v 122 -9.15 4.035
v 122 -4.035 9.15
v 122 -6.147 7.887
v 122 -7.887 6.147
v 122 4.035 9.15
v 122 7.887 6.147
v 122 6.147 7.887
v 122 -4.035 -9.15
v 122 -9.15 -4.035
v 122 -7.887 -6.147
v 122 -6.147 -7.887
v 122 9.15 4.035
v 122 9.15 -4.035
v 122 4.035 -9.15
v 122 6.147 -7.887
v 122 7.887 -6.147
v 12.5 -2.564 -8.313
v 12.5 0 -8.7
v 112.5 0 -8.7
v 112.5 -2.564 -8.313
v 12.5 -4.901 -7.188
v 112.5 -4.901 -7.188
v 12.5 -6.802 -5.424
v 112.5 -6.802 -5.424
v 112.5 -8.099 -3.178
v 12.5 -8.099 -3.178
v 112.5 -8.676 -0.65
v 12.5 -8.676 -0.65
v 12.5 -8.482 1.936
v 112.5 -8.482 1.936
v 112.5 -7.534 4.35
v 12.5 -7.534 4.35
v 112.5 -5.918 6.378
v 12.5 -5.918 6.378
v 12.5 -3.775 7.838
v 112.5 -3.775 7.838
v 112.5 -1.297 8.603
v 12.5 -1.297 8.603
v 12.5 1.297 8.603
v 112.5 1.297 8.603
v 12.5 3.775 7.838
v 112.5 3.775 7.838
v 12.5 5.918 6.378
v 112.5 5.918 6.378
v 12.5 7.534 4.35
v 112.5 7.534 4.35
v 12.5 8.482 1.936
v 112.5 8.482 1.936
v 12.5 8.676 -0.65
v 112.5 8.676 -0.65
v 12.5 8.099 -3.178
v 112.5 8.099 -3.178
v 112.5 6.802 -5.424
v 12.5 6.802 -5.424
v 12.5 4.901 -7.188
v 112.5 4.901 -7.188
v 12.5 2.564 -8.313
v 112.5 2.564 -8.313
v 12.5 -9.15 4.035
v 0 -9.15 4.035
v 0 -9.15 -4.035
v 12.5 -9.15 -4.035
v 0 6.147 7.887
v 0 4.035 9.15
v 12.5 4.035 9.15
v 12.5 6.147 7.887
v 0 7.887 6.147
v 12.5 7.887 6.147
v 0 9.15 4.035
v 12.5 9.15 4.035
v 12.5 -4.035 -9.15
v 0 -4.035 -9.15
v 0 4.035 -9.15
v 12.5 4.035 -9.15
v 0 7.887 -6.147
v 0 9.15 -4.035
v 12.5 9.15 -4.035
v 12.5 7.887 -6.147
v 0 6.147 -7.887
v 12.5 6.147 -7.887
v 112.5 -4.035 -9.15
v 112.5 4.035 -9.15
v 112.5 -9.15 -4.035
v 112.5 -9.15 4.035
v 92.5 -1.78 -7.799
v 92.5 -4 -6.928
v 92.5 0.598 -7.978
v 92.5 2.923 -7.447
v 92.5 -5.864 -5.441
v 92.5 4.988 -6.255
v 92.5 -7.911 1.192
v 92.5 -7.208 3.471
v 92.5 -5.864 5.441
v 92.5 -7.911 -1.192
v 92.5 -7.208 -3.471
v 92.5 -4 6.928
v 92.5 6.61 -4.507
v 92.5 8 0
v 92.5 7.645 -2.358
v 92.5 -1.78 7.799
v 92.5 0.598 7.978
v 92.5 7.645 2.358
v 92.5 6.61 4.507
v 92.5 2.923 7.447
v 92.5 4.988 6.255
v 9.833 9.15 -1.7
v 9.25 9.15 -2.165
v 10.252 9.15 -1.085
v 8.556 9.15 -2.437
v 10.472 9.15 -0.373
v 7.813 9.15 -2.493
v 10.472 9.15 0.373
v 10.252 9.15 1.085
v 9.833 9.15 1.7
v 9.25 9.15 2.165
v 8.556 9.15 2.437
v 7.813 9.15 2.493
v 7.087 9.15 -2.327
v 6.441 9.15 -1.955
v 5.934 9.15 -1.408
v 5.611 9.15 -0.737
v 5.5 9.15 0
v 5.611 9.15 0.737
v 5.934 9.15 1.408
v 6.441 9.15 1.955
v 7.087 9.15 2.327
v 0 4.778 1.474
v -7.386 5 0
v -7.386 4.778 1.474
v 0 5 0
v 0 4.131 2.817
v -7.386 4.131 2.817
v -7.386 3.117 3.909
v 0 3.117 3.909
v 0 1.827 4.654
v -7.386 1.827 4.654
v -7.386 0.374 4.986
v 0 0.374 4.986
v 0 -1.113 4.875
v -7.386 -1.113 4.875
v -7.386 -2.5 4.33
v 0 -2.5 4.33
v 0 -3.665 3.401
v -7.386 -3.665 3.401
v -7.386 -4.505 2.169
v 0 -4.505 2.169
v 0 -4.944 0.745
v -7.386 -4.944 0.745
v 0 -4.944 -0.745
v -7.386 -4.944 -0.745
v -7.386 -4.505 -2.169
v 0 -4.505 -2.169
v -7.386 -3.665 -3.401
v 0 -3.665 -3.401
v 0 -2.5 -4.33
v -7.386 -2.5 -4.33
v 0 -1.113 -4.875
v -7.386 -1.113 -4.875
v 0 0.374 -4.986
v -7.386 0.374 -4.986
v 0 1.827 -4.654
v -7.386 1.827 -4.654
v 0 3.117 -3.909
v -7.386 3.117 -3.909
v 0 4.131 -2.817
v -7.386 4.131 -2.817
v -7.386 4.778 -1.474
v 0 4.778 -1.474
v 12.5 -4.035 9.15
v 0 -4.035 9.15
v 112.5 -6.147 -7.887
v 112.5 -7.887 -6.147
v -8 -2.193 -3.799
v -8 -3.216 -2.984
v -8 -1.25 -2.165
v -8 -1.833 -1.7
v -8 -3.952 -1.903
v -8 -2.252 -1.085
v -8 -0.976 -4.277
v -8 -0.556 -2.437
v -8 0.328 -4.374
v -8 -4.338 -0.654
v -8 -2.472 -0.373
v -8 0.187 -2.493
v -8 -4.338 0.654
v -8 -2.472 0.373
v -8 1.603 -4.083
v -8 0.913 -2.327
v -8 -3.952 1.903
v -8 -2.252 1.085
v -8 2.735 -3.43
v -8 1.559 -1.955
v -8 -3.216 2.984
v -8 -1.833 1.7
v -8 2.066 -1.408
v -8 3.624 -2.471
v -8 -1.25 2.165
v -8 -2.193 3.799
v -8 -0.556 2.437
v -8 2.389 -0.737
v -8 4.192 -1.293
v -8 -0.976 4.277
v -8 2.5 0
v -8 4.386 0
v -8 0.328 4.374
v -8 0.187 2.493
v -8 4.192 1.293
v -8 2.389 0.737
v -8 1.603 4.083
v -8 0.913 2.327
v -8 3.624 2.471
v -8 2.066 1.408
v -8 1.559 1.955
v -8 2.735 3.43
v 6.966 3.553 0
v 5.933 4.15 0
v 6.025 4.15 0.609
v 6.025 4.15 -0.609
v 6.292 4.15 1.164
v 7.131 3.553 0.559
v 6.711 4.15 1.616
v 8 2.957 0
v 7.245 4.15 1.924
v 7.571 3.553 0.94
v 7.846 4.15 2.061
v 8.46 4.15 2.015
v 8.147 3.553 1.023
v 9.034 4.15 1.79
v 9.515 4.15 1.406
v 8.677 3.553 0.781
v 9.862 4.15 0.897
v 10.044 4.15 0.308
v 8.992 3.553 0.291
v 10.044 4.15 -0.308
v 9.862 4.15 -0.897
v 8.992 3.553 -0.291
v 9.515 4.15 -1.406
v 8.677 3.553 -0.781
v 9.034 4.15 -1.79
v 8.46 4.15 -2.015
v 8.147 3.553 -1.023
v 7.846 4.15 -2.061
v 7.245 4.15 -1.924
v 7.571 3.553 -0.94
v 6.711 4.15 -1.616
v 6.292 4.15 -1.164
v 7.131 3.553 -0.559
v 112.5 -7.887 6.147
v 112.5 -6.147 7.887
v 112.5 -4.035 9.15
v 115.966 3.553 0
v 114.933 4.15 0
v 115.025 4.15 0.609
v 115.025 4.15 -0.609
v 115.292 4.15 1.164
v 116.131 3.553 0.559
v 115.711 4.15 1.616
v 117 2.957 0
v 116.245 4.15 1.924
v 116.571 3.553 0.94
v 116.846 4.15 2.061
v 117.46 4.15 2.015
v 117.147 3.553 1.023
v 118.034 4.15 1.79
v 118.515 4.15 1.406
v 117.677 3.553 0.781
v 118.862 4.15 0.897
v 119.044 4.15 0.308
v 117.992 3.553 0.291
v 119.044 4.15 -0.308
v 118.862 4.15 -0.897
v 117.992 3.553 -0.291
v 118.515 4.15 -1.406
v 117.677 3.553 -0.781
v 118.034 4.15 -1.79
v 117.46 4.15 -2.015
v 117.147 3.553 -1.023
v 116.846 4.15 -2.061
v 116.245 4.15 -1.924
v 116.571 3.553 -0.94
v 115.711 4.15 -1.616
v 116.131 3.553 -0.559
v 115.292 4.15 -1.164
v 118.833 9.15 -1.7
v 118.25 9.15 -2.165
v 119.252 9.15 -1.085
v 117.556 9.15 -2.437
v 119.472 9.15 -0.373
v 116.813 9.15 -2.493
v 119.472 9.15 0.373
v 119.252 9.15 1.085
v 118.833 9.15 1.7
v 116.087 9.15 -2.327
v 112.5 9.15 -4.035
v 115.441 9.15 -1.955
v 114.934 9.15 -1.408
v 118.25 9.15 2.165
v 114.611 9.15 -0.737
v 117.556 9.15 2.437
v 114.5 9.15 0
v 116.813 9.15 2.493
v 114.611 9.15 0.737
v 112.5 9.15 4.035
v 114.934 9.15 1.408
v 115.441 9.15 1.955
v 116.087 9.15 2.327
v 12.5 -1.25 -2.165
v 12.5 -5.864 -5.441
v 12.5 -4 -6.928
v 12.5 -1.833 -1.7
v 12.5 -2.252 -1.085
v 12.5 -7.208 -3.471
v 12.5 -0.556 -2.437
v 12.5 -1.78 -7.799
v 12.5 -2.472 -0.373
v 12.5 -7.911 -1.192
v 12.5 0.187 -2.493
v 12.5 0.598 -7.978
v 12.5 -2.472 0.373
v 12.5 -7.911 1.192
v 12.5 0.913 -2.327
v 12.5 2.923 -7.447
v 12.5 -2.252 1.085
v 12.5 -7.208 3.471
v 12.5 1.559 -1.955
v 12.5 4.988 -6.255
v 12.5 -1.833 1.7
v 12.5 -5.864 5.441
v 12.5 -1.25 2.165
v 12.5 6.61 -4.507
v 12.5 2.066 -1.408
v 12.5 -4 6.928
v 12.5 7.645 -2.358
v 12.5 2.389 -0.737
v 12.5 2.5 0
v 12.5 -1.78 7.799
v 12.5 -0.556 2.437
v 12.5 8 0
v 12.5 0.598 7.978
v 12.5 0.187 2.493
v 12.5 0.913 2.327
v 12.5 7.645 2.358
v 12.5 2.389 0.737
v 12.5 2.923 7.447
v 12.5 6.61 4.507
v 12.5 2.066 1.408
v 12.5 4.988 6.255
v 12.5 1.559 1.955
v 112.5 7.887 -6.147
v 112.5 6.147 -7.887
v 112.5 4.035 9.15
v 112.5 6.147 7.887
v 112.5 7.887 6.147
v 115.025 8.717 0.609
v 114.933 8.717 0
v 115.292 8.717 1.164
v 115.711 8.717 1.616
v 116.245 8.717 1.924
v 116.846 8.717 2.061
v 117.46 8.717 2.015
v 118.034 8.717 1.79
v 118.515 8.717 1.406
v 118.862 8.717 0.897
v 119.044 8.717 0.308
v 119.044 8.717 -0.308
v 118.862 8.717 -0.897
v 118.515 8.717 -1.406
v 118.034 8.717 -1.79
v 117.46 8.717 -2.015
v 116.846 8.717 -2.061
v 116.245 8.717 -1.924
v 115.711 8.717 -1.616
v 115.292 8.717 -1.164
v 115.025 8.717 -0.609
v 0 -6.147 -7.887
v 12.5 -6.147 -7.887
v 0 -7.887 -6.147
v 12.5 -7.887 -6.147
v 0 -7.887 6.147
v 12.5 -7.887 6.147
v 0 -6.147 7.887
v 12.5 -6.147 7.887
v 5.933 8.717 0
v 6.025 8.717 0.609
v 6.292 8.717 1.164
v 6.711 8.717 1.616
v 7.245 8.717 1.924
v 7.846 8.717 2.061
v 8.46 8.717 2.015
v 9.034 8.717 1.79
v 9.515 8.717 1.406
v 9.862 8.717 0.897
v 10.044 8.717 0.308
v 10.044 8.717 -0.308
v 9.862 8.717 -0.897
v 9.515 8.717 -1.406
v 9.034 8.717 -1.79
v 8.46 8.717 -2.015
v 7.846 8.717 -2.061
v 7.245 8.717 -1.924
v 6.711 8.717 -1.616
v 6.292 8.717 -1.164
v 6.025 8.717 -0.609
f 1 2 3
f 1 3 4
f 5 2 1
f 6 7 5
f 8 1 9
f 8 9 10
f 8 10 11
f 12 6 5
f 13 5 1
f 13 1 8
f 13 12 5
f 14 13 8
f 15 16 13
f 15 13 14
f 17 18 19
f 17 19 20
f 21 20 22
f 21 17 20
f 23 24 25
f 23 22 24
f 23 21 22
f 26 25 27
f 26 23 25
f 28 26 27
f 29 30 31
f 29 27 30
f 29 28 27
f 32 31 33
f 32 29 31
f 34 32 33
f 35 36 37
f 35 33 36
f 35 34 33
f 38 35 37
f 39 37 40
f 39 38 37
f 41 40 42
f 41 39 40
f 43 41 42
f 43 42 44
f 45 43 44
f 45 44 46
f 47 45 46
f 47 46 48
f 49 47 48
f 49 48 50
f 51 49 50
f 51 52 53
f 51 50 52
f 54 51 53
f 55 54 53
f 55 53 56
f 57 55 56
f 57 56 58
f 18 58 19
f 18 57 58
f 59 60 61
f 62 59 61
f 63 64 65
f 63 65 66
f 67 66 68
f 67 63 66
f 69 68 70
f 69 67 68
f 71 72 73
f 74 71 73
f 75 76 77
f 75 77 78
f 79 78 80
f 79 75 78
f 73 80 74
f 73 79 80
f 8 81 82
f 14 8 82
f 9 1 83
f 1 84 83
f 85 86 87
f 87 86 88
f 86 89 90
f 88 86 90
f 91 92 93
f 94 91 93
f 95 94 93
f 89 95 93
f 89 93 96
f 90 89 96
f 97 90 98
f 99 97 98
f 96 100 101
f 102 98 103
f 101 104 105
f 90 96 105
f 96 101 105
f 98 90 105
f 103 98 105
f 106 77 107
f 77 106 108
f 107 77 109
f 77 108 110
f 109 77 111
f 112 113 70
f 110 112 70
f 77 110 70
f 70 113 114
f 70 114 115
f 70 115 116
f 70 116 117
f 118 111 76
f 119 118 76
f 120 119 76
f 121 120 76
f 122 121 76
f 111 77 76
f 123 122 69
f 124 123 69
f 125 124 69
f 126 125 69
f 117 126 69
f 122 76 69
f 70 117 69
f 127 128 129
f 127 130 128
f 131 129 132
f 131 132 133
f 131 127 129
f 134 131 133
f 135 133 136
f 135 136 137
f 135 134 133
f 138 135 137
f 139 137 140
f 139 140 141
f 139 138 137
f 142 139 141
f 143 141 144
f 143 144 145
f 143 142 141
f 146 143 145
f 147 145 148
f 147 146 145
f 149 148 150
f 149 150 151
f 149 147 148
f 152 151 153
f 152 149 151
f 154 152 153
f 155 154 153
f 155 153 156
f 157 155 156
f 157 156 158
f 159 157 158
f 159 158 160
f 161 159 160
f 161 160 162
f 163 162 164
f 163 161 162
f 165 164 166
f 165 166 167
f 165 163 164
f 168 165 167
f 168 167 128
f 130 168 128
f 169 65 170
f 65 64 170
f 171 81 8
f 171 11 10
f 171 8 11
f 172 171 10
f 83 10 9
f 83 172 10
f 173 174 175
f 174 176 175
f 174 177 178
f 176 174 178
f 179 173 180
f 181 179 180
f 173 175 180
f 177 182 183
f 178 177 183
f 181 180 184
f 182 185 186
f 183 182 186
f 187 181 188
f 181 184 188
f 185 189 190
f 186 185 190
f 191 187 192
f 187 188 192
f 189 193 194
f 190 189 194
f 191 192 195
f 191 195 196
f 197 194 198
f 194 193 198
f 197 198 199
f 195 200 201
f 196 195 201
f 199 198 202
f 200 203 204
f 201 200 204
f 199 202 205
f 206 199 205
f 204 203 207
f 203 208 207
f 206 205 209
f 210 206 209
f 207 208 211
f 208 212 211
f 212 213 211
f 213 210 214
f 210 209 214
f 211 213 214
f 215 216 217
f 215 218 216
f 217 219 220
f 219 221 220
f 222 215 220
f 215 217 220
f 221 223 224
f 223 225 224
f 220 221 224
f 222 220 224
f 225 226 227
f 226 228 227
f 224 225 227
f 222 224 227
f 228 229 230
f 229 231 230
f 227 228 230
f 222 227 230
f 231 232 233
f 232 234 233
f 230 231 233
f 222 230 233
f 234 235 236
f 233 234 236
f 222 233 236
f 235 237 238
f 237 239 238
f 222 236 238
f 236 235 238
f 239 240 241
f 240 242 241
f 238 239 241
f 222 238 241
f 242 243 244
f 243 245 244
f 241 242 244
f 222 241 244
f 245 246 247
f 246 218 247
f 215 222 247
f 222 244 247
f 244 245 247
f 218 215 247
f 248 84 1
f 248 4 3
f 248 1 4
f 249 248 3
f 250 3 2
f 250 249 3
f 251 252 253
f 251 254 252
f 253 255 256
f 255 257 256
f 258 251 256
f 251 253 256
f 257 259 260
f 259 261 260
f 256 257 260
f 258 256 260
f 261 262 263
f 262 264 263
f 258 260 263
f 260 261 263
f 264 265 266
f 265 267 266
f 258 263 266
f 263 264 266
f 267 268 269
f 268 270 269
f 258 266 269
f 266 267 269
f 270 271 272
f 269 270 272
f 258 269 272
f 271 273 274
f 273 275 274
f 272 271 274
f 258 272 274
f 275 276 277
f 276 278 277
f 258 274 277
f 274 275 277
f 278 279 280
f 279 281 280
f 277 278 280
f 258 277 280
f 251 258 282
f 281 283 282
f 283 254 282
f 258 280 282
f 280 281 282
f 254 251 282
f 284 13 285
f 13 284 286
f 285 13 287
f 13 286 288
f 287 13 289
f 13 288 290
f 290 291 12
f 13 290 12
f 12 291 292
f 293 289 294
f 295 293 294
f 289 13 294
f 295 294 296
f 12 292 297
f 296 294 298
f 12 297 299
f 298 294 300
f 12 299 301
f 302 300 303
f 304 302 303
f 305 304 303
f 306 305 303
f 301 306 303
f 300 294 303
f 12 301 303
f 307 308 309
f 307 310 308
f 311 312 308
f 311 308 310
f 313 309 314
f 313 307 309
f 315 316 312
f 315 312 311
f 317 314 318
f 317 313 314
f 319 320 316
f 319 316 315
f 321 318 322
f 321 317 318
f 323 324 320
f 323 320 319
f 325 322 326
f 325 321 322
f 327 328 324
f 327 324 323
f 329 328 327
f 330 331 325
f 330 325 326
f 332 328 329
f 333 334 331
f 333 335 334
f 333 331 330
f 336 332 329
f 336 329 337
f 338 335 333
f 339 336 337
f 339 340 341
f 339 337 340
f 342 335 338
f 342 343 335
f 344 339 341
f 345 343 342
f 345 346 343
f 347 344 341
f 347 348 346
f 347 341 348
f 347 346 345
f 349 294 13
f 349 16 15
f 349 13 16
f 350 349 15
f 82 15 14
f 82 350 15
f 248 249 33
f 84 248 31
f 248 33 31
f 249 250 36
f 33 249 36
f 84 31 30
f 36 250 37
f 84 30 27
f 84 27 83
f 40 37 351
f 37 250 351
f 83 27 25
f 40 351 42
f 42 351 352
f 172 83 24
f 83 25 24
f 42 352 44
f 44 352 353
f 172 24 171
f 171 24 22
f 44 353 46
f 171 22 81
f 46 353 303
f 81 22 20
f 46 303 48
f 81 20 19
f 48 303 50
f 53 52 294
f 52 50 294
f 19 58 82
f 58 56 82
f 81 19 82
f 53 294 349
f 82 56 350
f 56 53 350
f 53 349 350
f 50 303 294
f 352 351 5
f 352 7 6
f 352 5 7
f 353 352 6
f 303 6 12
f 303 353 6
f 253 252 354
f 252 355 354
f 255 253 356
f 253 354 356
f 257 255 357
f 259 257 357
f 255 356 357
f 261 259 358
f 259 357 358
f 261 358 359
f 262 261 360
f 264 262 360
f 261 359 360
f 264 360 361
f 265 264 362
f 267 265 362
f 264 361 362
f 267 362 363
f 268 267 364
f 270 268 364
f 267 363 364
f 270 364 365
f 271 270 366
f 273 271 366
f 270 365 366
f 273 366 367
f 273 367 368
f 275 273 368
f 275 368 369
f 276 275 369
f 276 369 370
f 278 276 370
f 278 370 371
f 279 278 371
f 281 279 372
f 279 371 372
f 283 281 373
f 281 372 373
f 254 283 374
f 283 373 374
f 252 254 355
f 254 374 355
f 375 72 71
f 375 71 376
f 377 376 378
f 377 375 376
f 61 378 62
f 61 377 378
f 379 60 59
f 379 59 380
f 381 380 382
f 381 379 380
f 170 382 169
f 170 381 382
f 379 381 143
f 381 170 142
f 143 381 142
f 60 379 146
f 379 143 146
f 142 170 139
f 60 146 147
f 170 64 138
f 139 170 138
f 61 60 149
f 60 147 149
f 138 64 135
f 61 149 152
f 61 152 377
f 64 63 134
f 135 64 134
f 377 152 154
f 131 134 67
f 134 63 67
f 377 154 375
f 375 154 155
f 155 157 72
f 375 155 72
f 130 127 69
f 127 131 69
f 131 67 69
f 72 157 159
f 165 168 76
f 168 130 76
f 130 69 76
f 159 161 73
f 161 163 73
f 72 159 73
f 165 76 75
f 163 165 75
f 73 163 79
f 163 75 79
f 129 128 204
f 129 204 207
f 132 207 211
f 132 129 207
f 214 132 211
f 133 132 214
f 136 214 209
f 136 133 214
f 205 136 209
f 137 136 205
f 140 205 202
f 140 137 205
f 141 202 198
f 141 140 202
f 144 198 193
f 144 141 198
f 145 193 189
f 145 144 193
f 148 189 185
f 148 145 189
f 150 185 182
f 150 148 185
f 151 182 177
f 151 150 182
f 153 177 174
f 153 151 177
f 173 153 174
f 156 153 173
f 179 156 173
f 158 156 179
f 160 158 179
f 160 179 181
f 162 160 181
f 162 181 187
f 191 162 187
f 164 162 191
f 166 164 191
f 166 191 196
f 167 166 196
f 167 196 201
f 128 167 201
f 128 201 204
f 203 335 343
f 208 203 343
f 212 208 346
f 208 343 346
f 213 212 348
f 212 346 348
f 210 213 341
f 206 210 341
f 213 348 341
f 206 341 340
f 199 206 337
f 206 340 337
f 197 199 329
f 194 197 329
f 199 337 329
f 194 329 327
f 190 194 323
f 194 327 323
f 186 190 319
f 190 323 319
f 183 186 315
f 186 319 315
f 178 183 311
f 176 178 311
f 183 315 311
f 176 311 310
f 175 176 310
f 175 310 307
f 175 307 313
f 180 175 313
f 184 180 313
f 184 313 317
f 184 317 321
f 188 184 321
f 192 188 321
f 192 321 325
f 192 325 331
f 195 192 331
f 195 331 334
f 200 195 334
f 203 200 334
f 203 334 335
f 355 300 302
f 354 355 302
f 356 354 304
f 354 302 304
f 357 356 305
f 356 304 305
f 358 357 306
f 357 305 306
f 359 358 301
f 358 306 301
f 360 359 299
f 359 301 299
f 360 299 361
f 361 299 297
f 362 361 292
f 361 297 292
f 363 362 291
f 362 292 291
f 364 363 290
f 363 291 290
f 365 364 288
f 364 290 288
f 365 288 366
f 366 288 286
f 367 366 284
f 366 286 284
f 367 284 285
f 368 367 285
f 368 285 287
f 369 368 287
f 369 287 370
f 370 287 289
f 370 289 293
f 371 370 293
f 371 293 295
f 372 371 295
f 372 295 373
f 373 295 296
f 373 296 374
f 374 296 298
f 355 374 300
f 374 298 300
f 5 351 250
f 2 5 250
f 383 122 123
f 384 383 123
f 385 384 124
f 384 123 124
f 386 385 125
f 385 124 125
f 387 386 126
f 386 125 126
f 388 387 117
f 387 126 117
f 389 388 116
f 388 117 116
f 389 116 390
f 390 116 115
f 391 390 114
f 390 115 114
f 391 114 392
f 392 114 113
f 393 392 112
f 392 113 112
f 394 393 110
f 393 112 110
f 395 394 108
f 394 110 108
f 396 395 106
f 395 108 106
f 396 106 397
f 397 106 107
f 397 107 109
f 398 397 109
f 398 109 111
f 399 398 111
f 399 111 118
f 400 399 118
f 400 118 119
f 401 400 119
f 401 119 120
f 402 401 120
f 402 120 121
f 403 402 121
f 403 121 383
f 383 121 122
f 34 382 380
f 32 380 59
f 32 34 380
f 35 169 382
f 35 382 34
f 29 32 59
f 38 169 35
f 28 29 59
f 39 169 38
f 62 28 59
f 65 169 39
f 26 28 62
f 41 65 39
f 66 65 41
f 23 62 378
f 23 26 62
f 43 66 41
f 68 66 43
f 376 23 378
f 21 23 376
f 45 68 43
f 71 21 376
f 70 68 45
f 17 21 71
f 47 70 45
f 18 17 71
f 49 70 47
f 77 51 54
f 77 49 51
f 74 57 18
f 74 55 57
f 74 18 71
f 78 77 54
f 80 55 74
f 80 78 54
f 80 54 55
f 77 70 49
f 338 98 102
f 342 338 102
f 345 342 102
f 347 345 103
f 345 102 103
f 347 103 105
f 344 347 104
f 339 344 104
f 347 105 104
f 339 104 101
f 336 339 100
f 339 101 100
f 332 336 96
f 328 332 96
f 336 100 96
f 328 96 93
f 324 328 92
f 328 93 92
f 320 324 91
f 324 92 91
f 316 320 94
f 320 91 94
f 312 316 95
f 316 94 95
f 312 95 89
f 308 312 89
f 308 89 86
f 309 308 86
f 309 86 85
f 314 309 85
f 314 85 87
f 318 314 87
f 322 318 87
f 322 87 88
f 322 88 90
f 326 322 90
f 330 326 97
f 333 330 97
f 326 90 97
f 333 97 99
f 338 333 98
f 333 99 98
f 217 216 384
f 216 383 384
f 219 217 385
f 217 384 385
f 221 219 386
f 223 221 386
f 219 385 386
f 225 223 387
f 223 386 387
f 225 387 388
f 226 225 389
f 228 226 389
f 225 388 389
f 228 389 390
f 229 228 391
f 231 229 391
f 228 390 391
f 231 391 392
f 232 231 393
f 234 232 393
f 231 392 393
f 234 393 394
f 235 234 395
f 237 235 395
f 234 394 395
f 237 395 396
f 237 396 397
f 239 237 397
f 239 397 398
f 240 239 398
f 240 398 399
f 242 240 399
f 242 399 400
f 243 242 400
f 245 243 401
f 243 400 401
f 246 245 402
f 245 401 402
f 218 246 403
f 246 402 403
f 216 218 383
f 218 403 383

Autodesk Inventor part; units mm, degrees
sketch "Sketch_8" plane through (0, 0, 0) normal (0, 0, 1) x (1, 0, 0)
  line L0 (0, 0) -> (-8, 0)
  line L1 (-8, 0) -> (-8, 4.3865)
  line L2 (-8, 4.3865) -> (-7.3865, 5)
  line L3 (-7.3865, 5) -> (0, 5)
  line L4 (0, 5) -> (0, 0)
  line L5 (0, 0) -> (-8, 0)
revolve "Revolution1" add sketch "Sketch_8" angle 360 about axis through (0, 0, 0) along (1, 0, 0)
thread "Thread1" size "M10x1" class "6g" standard "ISO Metric profile" length 5.8865
sketch "Sketch_9" plane through (0, 0, 0) normal (1, 0, 0) x (0, 0, -1)
  line L0 (-9.15, 4.0345) -> (-9.15, -4.0345)
  arc A0 (-9.15, -4.0345) -> (-4.0345, -9.15) centre (0, 0) ccw
  line L1 (-4.0345, -9.15) -> (4.0345, -9.15)
  arc A1 (4.0345, -9.15) -> (9.15, -4.0345) centre (0, 0) ccw
  line L2 (9.15, -4.0345) -> (9.15, 4.0345)
  arc A2 (9.15, 4.0345) -> (4.0345, 9.15) centre (0, 0) ccw
  line L3 (4.0345, 9.15) -> (-4.0345, 9.15)
  arc A3 (-4.0345, 9.15) -> (-9.15, 4.0345) centre (0, 0) ccw
extrude "Extrusion1" add sketch "Sketch_9" along normal blind 12.5
sketch "Sketch_11" plane through (12.5, 0, 0) normal (1, 0, 0) x (0, 0, -1)
  circle A0 centre (0, 0) radius 8.7
extrude "Extrusion2" add sketch "Sketch_11" along normal blind 100
sketch "Sketch_10" plane through (112.5, 0, 0) normal (1, 0, 0) x (0, 0, -1)
  line L0 (-9.15, 4.0345) -> (-9.15, -4.0345)
  arc A0 (-9.15, -4.0345) -> (-4.0345, -9.15) centre (0, 0) ccw
  line L1 (-4.0345, -9.15) -> (4.0345, -9.15)
  arc A1 (4.0345, -9.15) -> (9.15, -4.0345) centre (0, 0) ccw
  line L2 (9.15, -4.0345) -> (9.15, 4.0345)
  arc A2 (9.15, 4.0345) -> (4.0345, 9.15) centre (0, 0) ccw
  line L3 (4.0345, 9.15) -> (-4.0345, 9.15)
  arc A3 (-4.0345, 9.15) -> (-9.15, 4.0345) centre (0, 0) ccw
extrude "Extrusion3" add sketch "Sketch_10" along normal blind 9.5
sketch "Sketch7" plane through (0, 0, 0) normal (0, 0, 1) x (1, 0, 0)
  line L0 (8, 9.15) -> (8, 4.15)
  line L1 (8, 2.9566) -> (5.933, 4.15)
  line L2 (5.933, 4.15) -> (5.933, 8.717)
  line L3 (5.933, 8.717) -> (5.5, 9.15)
  line L4 (5.5, 9.15) -> (8, 9.15)
  line L5 (8, 9.15) -> (8, 2.9566)
revolve "Revolution2" cut sketch "Sketch7" angle 360 about axis through (8, 9.15, 0) along (0, 1, 0)
thread "Thread2" size "M5x0.8" class "6H" standard "ISO Metric profile" full length
sketch "Sketch_7" plane through (0, 0, 0) normal (0, 0, 1) x (1, 0, 0)
  line L0 (117, 9.15) -> (117, 4.15)
  line L1 (117, 2.9566) -> (114.933, 4.15)
  line L2 (114.933, 4.15) -> (114.933, 8.717)
  line L3 (114.933, 8.717) -> (114.5, 9.15)
  line L4 (114.5, 9.15) -> (117, 9.15)
  line L5 (117, 9.15) -> (117, 2.9566)
revolve "Revolution3" cut sketch "Sketch_7" angle 360 about axis through (117, 9.15, 0) along (0, 1, 0)
thread "Thread3" size "M5x0.8" class "6H" standard "ISO Metric profile" full length
sketch "Sketch_16" plane through (0, 0, 0) normal (0, 0, 1) x (1, 0, 0)
  line L0 (92.5, 0) -> (-8, 0)
  line L1 (-8, 0) -> (-8, 2.5)
  line L2 (-8, 2.5) -> (12.5, 2.5)
  line L3 (12.5, 2.5) -> (12.5, 8)
  line L4 (12.5, 8) -> (92.5, 8)
  line L5 (92.5, 8) -> (92.5, 0)
  line L6 (92.5, 0) -> (-8, 0)
revolve "Revolution4" cut sketch "Sketch_16" angle 360 about axis through (92.5, 0, 0) along (1, 0, 0)
ref_plane "BODY_N_XY" through (122, 0, 0) normal (0, 0, -1) x (1, 0, 0)
ref_plane "BODY_N_YZ" through (122, 0, 0) normal (1, 0, 0) x (0, -1, 0)
ref_plane "BODY_N_ZX" through (122, 0, 0) normal (0, -1, 0) x (0, 0, -1)
ref_plane "NUT2_XY" through (122, 0, 0) normal (1, 0, 0) x (0, 0, -1)
ref_plane "NUT2_YZ" through (122, 0, 0) normal (0, 0, -1) x (0, 1, 0)
ref_plane "NUT2_ZX" through (122, 0, 0) normal (0, 1, 0) x (1, 0, 0)
ref_plane "SW1_XY" through (17.5, 0, 0) normal (1, 0, 0) x (0, 0, -1)
ref_plane "SW1_YZ" through (17.5, 0, 0) normal (0, 0, -1) x (0, 1, 0)
ref_plane "SW1_ZX" through (17.5, 0, 0) normal (0, 1, 0) x (1, 0, 0)
ref_plane "SW2_XY" through (107.5, 0, 0) normal (-1, 0, 0) x (0, 0, -1)
ref_plane "SW2_YZ" through (107.5, 0, 0) normal (0, 0, -1) x (0, -1, 0)
ref_plane "SW2_ZX" through (107.5, 0, 0) normal (0, -1, 0) x (-1, 0, 0)
ref_plane "SW_R1_XY" through (17.5, -14.15, 0) normal (1, 0, 0) x (0, 0, -1)
ref_plane "SW_R1_YZ" through (17.5, -14.15, 0) normal (0, 0, -1) x (0, 1, 0)
ref_plane "SW_R1_ZX" through (17.5, -14.15, 0) normal (0, 1, 0) x (1, 0, 0)
ref_plane "SW_R2_XY" through (107.5, -14.15, 0) normal (-1, 0, 0) x (0, 0, -1)
ref_plane "SW_R2_YZ" through (107.5, -14.15, 0) normal (0, 0, -1) x (0, -1, 0)
ref_plane "SW_R2_ZX" through (107.5, -14.15, 0) normal (0, -1, 0) x (-1, 0, 0)
ref_plane "body_XY" through (0, 0, 0) normal (1, 0, 0) x (0, 0, -1)
ref_plane "body_YZ" through (0, 0, 0) normal (0, 0, -1) x (0, 1, 0)
ref_plane "body_ZX" through (0, 0, 0) normal (0, 1, 0) x (1, 0, 0)
properties part number "CJ2B16-75Z(1_0)_BODY"
